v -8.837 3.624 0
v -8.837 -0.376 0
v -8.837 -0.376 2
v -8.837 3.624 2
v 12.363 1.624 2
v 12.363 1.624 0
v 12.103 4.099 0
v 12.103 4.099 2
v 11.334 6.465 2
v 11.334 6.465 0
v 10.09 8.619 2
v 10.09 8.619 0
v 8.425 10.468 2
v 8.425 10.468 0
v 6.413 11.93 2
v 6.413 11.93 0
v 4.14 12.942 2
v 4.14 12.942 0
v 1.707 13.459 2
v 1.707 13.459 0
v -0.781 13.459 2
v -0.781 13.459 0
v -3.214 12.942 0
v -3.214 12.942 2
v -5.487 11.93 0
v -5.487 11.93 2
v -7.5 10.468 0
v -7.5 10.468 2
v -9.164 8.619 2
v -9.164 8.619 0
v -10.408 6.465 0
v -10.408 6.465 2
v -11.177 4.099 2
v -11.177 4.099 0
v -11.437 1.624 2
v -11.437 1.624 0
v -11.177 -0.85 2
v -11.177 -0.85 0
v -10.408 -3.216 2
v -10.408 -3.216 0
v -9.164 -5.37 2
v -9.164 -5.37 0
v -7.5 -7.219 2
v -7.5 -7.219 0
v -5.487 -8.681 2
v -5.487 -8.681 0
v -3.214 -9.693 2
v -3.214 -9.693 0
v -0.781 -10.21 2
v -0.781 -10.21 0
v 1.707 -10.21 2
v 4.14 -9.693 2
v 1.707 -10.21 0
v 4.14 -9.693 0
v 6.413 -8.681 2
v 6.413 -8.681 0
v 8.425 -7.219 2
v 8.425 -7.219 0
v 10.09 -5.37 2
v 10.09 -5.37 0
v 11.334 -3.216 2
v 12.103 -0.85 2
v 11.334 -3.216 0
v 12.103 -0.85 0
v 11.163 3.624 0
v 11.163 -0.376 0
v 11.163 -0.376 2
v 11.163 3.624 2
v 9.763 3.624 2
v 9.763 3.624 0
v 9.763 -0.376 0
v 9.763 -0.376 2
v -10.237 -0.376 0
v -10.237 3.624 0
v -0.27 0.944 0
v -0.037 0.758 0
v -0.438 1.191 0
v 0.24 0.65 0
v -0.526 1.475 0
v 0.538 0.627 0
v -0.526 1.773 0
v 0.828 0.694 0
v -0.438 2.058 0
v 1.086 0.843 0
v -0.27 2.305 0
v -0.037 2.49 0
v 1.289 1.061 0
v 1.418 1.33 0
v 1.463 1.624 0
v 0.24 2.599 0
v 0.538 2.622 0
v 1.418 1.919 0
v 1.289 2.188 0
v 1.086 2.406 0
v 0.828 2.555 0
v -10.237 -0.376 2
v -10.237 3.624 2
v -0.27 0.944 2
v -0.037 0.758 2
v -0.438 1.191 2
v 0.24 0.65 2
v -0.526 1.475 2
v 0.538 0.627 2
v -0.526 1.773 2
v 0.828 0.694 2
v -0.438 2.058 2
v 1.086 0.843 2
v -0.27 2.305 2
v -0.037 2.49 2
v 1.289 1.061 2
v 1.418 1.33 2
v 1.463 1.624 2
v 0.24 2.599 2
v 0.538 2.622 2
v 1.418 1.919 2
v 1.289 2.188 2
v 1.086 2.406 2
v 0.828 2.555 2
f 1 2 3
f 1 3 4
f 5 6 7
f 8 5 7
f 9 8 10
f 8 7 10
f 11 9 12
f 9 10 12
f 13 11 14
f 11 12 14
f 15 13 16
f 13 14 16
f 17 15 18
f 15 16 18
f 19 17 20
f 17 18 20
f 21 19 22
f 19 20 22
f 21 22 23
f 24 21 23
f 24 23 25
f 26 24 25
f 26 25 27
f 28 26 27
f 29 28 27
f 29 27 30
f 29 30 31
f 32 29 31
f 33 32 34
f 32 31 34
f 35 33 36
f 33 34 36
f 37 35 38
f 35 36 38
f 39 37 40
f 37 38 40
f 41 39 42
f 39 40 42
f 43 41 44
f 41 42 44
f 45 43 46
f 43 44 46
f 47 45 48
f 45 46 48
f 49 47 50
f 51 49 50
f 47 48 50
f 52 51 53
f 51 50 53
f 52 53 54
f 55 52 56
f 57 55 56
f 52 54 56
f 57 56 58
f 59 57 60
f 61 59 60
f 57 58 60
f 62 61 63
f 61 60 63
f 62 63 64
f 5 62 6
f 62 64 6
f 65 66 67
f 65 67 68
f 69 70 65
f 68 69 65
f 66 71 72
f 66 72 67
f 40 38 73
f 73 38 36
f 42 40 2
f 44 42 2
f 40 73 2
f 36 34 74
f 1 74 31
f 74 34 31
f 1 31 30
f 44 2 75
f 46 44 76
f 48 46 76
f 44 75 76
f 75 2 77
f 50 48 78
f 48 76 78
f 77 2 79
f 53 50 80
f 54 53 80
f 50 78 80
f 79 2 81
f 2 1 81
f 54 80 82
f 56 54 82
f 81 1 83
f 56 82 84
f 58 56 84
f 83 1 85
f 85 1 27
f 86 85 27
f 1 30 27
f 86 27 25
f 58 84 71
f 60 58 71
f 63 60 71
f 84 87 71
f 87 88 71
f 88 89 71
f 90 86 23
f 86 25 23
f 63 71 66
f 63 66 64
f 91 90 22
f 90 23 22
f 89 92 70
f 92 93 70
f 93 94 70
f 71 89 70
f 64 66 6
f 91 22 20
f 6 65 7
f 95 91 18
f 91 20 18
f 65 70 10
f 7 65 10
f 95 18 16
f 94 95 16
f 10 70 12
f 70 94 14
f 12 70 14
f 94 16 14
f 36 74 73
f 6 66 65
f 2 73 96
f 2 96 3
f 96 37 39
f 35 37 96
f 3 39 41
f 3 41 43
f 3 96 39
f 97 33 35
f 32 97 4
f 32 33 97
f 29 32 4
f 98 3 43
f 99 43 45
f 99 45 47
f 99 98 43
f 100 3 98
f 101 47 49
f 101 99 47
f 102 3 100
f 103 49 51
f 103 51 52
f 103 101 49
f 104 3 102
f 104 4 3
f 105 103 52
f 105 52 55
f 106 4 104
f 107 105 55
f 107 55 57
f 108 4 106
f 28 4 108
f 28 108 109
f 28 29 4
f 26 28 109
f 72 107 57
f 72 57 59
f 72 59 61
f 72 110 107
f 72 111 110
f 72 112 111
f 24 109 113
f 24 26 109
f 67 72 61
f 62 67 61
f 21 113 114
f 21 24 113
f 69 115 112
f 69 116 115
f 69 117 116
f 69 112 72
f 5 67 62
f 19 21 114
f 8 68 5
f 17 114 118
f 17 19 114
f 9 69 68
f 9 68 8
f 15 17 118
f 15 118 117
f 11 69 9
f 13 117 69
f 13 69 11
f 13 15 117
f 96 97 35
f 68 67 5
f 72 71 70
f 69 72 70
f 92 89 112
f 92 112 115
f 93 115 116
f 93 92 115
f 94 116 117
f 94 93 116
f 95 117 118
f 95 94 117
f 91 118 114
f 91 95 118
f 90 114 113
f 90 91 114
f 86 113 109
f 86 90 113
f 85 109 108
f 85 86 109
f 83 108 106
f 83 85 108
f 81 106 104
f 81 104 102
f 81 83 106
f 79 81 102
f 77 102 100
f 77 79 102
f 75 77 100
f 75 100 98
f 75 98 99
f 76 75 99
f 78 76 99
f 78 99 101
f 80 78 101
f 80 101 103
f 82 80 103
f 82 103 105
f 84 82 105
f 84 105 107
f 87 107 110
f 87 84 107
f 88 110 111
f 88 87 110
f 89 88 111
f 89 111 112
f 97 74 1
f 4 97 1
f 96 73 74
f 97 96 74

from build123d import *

# Parameters (mm, degrees)
SKETCH1_R           = 11.9
SKETCH1_R_2         = 1
SKETCH1_W           = 1.4
SKETCH1_H           = 4
BOSS_EXTRUDE1_DEPTH = 2


with BuildPart() as part:
    # Sketch1 → Boss-Extrude1 (new body)
    with BuildSketch(Plane.XY):
        with Locations((0.462805042, 1.624450899)):
            Circle(SKETCH1_R)
        with Locations((0.462805042, 1.624450899)):
            Circle(SKETCH1_R_2, mode=Mode.SUBTRACT)
        with Locations((10.462805042, 1.624450899)):
            Rectangle(SKETCH1_W, SKETCH1_H, mode=Mode.SUBTRACT)
        with Locations((-9.537194958, 1.624450899)):
            Rectangle(SKETCH1_W, SKETCH1_H, mode=Mode.SUBTRACT)
    extrude(amount=BOSS_EXTRUDE1_DEPTH)


solid = part.part
